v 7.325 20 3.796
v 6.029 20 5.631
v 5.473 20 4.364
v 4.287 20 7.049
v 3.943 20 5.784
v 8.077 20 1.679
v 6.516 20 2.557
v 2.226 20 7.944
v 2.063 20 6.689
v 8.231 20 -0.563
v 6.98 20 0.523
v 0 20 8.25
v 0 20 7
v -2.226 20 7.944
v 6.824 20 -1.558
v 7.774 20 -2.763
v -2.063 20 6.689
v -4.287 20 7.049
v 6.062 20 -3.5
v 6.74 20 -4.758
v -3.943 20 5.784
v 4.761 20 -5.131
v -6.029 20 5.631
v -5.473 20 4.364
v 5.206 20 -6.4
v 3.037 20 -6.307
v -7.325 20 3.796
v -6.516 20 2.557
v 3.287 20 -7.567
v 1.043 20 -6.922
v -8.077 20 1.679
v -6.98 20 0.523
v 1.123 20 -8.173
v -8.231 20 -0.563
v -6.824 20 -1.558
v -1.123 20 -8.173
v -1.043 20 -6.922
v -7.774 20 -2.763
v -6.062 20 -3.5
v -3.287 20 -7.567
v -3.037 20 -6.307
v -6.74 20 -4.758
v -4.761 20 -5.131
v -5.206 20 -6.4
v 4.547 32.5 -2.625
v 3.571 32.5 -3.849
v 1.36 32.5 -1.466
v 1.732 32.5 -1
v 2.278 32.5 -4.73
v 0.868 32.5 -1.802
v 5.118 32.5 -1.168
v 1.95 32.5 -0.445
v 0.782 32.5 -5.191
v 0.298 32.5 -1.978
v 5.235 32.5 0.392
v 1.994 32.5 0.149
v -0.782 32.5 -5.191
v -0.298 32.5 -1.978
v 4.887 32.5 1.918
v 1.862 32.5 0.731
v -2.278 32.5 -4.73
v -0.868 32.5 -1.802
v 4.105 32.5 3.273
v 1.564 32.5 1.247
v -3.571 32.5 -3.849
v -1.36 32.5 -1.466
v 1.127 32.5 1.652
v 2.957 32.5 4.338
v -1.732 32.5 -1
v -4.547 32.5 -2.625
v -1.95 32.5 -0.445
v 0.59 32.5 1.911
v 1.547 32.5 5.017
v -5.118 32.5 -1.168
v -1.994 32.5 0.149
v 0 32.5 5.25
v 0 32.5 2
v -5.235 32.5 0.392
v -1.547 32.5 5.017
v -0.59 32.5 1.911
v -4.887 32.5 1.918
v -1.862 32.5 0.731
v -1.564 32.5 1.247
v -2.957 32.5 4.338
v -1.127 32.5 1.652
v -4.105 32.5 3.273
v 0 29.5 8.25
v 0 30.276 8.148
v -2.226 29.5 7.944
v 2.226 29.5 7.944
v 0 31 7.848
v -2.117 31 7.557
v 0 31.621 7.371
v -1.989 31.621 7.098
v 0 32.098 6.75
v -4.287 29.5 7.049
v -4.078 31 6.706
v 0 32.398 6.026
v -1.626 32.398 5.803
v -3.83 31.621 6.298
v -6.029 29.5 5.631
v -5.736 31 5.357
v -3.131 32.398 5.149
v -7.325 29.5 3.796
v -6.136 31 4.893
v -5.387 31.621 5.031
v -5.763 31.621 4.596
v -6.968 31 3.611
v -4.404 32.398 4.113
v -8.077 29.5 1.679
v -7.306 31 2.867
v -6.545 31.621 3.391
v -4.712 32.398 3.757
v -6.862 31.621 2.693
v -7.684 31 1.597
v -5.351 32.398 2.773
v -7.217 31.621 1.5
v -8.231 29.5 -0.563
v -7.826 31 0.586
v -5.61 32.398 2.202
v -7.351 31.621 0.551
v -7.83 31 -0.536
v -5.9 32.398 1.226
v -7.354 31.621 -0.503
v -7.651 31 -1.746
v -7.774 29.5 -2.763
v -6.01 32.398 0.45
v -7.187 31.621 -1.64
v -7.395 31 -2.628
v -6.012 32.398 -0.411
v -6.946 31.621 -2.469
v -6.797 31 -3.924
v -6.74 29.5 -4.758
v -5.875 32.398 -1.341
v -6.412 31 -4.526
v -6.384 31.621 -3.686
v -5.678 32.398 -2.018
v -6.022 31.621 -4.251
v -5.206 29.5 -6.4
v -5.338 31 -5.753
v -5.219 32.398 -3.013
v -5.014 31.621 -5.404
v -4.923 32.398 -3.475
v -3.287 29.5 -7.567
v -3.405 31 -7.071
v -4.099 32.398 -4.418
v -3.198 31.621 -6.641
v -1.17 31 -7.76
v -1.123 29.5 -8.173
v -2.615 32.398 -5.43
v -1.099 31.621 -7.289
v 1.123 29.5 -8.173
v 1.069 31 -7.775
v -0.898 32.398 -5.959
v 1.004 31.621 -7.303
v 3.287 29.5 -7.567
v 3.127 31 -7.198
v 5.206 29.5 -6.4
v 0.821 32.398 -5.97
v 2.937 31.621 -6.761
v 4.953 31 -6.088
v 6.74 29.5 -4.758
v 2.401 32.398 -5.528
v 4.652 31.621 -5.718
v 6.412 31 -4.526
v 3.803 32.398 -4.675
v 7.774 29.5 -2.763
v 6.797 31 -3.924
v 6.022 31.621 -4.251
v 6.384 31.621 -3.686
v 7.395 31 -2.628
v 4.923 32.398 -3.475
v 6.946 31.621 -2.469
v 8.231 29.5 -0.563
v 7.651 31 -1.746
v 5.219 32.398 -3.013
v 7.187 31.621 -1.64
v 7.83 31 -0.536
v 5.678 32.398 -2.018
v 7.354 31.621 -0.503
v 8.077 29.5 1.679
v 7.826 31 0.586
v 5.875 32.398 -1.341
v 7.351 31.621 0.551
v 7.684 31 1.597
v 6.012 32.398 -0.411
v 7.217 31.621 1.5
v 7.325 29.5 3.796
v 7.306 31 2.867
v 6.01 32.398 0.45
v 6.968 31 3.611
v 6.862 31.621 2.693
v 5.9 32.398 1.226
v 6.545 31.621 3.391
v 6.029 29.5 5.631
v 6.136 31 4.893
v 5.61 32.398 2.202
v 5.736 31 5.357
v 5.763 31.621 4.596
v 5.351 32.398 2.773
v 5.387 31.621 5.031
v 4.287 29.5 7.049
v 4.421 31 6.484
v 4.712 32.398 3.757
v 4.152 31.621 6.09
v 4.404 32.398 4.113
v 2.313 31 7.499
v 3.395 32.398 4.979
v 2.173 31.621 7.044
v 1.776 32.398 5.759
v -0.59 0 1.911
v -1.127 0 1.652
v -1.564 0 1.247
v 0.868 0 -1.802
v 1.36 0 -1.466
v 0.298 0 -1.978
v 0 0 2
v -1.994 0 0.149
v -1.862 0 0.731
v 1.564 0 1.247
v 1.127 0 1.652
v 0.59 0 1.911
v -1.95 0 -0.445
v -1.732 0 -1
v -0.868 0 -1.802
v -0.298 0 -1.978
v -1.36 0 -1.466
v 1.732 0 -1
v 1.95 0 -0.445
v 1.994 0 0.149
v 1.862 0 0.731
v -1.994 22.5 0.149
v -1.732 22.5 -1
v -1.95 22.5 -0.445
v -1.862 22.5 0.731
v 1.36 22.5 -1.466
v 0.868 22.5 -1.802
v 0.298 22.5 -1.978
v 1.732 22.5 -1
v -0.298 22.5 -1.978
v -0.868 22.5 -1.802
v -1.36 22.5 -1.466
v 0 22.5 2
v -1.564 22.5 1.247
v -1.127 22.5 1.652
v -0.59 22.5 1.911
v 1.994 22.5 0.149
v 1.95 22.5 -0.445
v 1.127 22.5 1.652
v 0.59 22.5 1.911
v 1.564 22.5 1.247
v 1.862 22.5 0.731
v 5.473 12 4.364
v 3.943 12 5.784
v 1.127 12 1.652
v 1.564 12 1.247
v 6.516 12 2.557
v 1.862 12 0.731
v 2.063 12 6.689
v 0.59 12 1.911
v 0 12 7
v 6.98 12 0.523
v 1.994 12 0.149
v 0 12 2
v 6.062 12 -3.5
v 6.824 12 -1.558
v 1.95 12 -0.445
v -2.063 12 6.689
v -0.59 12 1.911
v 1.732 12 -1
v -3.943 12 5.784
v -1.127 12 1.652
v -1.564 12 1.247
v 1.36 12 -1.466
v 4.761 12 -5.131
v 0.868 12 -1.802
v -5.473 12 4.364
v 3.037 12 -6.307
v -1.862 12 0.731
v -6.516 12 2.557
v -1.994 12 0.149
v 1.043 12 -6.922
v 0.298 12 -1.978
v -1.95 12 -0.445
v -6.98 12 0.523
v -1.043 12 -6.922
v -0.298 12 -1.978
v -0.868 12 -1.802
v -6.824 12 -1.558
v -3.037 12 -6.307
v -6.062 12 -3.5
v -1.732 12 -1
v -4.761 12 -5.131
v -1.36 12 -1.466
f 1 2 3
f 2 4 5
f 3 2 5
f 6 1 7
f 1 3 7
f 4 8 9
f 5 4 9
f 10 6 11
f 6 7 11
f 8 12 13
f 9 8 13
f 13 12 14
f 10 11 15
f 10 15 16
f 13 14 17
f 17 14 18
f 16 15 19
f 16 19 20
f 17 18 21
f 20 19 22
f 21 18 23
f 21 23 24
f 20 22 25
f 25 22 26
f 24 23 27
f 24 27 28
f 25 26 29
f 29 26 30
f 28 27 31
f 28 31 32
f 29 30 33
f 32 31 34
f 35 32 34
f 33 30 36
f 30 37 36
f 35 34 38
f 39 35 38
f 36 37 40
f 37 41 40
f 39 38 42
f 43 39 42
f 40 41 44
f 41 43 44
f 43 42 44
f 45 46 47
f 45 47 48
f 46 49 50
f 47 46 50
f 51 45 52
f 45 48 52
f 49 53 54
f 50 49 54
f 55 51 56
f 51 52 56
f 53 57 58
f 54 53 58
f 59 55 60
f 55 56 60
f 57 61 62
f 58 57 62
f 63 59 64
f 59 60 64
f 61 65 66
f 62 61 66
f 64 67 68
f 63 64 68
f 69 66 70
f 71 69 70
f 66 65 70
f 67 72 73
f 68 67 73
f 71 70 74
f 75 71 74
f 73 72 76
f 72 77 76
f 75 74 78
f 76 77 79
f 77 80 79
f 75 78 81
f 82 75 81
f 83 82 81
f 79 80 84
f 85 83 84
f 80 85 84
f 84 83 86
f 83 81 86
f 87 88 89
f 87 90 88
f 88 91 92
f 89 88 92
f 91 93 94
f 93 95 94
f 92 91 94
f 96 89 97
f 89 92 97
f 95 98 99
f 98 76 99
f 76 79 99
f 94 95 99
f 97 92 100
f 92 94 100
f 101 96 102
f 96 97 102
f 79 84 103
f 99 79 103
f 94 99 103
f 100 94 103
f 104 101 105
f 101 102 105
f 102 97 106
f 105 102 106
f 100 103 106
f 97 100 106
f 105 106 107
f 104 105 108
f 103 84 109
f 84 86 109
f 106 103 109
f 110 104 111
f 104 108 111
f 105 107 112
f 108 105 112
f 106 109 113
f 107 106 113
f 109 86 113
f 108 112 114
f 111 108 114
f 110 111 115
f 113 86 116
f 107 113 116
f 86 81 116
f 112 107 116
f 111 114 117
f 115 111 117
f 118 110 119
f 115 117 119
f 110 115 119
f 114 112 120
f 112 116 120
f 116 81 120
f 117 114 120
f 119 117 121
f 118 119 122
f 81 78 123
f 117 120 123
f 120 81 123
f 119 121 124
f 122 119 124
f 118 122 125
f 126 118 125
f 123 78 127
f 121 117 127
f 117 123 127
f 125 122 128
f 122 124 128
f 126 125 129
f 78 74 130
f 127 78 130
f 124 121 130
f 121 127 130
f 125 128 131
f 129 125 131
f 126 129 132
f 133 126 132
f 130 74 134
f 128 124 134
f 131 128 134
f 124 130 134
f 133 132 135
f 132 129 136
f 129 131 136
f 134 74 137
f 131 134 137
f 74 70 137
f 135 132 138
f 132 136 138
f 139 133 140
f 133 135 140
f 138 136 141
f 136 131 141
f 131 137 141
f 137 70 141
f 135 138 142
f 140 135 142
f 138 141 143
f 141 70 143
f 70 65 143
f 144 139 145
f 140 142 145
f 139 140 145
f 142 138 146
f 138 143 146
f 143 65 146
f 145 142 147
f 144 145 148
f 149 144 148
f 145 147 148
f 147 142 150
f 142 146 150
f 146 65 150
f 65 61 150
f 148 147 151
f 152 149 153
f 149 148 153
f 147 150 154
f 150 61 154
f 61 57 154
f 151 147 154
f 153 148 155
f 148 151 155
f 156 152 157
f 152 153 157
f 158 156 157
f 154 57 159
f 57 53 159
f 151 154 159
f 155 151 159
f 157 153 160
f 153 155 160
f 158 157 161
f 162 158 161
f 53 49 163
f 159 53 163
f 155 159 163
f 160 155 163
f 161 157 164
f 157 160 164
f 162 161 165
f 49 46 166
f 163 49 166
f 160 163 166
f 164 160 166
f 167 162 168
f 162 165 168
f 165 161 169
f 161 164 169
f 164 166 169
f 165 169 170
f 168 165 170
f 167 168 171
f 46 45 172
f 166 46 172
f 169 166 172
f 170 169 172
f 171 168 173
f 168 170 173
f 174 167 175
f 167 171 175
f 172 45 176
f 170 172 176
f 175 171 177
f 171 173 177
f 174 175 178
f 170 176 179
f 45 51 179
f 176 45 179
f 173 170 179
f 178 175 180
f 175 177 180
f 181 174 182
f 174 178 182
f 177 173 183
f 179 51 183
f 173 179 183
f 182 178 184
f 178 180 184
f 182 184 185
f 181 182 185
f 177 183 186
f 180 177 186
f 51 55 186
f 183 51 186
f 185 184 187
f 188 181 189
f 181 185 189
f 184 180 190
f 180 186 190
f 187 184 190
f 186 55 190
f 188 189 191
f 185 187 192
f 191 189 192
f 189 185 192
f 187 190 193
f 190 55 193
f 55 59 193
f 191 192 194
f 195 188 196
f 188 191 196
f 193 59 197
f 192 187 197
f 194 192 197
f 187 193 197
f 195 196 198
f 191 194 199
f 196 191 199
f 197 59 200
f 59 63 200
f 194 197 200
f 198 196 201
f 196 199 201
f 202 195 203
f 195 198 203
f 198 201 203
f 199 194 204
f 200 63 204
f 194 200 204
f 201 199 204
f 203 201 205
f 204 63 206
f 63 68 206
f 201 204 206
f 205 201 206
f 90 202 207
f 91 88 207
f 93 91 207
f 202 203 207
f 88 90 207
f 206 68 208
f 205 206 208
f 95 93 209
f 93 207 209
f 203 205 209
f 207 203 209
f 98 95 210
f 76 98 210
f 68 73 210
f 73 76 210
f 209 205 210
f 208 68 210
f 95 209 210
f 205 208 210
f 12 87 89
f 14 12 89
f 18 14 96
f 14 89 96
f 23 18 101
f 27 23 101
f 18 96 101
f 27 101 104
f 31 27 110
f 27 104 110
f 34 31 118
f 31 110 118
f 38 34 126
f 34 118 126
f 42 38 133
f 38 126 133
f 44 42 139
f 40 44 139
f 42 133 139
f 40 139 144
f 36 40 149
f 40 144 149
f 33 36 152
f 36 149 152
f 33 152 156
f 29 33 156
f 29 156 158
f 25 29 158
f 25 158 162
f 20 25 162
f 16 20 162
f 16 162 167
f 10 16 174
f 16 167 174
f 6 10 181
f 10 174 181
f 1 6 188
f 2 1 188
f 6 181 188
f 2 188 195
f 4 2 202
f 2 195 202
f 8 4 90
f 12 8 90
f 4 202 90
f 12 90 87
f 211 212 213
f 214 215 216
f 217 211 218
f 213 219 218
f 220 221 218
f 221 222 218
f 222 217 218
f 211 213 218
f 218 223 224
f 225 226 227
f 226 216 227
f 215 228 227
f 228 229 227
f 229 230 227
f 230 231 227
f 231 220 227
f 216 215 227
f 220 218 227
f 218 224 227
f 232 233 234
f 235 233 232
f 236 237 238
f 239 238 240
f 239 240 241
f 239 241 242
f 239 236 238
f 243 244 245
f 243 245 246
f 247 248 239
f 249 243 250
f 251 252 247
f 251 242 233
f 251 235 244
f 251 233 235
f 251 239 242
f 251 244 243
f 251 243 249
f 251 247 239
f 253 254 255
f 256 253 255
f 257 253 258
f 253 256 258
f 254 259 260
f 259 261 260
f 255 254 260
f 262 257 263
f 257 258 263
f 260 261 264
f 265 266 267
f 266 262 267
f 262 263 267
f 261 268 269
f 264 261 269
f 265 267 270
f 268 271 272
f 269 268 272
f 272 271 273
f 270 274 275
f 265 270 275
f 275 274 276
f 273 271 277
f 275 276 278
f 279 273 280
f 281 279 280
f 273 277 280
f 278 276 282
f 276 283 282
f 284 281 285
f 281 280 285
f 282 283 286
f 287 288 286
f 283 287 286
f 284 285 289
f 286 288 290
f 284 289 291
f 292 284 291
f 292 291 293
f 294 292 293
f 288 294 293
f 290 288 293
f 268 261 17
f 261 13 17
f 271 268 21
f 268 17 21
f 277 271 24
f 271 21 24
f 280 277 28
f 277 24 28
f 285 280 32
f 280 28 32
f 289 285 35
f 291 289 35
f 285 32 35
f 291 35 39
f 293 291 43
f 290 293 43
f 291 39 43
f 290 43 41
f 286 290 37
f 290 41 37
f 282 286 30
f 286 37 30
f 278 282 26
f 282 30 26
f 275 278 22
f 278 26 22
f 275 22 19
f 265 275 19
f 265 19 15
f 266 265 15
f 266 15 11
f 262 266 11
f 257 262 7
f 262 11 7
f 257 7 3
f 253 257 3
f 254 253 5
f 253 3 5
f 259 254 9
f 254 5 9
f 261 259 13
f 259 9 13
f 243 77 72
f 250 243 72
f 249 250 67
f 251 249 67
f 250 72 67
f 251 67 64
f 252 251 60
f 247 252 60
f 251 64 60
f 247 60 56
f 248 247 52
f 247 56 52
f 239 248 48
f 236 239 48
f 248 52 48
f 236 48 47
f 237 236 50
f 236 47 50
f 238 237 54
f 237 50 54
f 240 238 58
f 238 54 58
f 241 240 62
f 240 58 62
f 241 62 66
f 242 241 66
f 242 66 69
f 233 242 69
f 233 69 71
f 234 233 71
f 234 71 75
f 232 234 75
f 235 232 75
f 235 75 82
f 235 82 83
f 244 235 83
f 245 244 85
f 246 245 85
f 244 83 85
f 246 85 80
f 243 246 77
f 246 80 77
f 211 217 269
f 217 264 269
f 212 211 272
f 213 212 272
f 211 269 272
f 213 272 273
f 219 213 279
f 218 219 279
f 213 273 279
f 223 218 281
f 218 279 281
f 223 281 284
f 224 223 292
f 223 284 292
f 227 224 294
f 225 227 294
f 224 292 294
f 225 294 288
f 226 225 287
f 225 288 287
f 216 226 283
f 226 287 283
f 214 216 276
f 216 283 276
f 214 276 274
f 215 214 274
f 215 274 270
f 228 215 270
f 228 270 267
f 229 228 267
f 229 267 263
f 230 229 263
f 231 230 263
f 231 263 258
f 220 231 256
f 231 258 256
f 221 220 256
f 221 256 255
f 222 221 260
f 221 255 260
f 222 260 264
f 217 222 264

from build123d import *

# Parameters (mm, degrees)
CROQUIS2_R            = 2
CORTAR_EXTRUIR1_DEPTH = 10
REDONDEO1_R           = 3


with BuildPart() as part:
    # Croquis1 → Revolución1 (revolve)
    with BuildSketch(Plane.XY, mode=Mode.PRIVATE) as revoluci_n1_sk:
        Polygon((0, 0), (2, 0), (2, 12), (7, 12), (7, 20), (8.25, 20), (8.25, 32.5), (0, 32.5), align=None)
    revolve(revoluci_n1_sk.sketch.rotate(Axis((0, 32.5, 0), (0, -1, 0)), 90), axis=Axis((0, 32.5, 0), (0, -1, 0)))

    # Croquis2 → Cortar-Extruir1 (cut)
    with BuildSketch(Plane(origin=(0, 32.5, 0), x_dir=(1, 0, 0), z_dir=(0, 1, 0))):
        with Locations(Location((0, 0, 0), (0, 0, 270))):
            Circle(CROQUIS2_R)
    extrude(amount=-CORTAR_EXTRUIR1_DEPTH, mode=Mode.SUBTRACT)

    # Redondeo1
    redondeo1_edges = [part.edges().sort_by_distance(p)[0] for p in [
        (0, 32.5, -8.25),
    ]]
    fillet(redondeo1_edges, radius=REDONDEO1_R)


solid = part.part
